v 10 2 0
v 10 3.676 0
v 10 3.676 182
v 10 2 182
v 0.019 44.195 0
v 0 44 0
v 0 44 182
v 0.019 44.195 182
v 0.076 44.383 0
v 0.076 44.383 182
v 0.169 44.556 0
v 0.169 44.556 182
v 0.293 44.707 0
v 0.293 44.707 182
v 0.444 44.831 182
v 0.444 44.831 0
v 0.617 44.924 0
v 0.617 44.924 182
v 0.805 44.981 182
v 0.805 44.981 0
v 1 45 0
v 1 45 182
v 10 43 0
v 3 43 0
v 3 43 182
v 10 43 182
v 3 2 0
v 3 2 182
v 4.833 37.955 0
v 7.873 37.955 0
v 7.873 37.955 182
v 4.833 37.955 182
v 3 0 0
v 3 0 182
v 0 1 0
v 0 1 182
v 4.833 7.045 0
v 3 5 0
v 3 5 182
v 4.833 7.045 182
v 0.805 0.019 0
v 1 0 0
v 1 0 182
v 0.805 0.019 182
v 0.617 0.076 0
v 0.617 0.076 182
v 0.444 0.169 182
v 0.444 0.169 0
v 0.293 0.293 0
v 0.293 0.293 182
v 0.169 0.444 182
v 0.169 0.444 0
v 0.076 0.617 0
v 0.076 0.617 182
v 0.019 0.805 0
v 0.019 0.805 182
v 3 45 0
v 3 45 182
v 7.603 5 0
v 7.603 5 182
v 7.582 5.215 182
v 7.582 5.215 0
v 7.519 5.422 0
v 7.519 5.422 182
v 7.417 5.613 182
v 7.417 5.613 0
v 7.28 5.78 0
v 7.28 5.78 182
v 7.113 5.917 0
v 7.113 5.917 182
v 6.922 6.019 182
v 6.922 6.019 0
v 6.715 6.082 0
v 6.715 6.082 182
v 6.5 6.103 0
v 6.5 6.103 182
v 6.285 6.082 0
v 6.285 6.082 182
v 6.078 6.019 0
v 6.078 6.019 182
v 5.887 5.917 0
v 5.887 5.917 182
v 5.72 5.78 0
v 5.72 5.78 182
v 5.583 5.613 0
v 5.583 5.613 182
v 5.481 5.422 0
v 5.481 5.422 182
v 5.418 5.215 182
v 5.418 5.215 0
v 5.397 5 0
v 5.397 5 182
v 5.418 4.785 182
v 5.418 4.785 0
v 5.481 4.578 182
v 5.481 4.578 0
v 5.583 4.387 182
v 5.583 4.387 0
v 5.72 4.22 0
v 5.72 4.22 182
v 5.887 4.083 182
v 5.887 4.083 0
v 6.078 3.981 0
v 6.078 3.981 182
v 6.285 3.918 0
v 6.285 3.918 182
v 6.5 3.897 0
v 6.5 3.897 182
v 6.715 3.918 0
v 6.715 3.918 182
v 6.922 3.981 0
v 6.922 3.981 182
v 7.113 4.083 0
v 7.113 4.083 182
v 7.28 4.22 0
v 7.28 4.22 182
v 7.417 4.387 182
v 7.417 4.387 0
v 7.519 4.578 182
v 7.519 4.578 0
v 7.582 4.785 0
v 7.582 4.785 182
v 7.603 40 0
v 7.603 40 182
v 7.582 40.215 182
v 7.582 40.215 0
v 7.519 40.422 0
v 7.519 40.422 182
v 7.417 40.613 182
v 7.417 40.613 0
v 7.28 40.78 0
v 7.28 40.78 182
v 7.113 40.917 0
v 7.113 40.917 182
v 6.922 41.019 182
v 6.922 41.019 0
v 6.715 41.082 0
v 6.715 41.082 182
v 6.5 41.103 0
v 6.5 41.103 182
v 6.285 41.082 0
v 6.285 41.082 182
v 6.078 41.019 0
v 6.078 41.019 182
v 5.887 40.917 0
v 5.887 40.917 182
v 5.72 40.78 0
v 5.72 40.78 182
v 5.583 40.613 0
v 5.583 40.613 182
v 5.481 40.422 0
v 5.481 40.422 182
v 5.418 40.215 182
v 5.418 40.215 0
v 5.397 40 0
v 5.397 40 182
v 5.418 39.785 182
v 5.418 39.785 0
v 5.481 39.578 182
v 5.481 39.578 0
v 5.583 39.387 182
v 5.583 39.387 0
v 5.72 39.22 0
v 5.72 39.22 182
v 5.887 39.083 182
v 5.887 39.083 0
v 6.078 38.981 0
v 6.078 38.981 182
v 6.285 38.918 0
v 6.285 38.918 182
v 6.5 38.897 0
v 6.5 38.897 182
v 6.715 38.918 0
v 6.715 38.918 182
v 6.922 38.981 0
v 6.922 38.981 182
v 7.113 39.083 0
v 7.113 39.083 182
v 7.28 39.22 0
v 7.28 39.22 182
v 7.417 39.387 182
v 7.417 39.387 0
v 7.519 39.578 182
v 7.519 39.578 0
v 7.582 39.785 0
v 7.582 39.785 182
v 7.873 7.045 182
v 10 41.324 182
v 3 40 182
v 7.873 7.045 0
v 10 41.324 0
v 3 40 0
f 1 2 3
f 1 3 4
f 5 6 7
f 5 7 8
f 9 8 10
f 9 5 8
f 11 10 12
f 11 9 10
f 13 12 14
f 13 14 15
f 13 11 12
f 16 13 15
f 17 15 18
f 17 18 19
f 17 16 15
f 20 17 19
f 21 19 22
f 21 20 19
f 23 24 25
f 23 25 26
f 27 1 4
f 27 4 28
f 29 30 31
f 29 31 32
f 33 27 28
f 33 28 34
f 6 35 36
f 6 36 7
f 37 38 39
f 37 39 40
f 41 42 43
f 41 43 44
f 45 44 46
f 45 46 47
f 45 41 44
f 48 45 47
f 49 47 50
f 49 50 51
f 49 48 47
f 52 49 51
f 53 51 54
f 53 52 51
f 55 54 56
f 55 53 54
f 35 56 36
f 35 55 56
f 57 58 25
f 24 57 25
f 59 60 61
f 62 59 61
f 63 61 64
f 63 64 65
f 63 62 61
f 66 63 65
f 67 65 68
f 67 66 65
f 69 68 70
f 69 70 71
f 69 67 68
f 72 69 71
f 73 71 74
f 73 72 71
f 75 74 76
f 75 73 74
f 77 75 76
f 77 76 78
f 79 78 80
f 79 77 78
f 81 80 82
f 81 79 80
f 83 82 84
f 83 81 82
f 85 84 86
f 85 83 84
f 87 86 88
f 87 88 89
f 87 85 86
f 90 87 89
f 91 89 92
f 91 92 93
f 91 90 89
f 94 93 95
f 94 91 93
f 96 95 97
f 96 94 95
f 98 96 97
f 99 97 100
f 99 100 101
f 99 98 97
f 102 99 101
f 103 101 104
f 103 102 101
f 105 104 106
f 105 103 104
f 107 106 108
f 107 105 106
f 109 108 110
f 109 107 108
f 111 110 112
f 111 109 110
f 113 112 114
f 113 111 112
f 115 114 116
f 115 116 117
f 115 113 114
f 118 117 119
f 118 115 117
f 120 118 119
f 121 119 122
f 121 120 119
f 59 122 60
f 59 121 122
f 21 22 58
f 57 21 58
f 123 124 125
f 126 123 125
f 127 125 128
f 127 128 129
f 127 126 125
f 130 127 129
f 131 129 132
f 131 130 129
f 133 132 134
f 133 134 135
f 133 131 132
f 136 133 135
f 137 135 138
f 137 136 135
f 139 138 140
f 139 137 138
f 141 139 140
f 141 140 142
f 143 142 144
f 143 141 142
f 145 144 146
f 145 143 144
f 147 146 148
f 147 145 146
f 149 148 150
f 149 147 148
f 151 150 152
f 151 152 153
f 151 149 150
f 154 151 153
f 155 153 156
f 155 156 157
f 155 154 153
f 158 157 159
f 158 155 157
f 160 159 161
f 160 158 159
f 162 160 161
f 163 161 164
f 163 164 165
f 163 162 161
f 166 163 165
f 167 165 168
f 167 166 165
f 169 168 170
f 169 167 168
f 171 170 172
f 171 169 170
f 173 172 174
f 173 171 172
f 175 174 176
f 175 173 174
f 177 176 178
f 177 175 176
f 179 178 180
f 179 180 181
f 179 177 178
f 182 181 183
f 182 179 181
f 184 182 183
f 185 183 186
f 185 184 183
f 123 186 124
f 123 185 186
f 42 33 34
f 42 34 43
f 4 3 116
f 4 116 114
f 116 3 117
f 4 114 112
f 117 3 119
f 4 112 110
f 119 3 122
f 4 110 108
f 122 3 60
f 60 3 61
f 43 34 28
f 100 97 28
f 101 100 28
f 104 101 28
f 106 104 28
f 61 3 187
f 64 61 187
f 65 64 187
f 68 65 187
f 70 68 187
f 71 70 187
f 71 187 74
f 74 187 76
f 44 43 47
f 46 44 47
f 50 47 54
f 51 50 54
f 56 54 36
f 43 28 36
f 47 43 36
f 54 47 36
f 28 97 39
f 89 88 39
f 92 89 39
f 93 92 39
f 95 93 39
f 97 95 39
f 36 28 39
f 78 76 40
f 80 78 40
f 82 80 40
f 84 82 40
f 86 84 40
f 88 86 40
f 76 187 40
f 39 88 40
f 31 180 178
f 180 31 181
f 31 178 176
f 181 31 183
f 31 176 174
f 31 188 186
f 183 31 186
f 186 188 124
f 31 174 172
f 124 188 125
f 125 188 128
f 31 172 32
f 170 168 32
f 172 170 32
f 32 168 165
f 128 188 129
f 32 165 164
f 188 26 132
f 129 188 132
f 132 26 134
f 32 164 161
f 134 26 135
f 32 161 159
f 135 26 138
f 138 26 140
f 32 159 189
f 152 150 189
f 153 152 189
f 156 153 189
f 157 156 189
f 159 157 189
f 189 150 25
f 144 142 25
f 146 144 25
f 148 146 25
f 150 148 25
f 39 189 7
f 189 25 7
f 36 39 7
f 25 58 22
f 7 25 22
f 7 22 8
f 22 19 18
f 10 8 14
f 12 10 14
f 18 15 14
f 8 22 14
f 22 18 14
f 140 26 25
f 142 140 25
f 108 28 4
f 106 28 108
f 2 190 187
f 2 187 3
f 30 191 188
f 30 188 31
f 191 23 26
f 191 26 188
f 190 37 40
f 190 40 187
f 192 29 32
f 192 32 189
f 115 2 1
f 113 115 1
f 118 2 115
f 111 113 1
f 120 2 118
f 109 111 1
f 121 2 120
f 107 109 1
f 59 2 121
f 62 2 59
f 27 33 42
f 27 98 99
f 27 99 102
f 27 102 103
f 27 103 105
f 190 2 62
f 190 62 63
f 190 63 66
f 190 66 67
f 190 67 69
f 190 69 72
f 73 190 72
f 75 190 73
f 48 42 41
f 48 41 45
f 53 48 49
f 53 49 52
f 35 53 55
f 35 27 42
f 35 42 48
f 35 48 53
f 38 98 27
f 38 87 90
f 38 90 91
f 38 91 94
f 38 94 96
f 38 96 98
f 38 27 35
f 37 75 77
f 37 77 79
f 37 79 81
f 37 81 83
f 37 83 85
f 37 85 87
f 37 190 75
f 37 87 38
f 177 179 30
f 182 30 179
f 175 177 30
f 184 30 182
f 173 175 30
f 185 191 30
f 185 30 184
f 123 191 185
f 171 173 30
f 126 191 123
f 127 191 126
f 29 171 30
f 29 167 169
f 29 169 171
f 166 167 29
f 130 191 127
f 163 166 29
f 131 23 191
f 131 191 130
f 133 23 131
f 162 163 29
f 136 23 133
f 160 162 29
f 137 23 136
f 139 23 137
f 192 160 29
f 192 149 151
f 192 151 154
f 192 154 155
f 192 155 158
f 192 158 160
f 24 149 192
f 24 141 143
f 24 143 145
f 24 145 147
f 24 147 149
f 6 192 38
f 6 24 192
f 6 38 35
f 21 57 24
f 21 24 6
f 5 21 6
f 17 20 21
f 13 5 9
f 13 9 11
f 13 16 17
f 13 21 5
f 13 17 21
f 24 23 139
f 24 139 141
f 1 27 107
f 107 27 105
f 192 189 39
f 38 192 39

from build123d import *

# Parameters (mm, degrees)
SKETCH_1_R      = 1.102856911
EXTRUDE_1_DEPTH = 182


with BuildPart() as part:
    # 草图1 → 凸台-拉伸1 (new body)
    with BuildSketch(Plane.XY):
        with BuildLine():
            Line((1, 45), (3, 45))
            Line((3, 45), (3, 43))
            Line((3, 43), (10, 43))
            Line((10, 43), (10, 41.324203171))
            Line((10, 41.324203171), (7.873486532, 37.954843198))
            Line((7.873486532, 37.954843198), (4.832988285, 37.954843198))
            Line((4.832988285, 37.954843198), (3, 40))
            Line((3, 40), (3, 5))
            Line((3, 5), (4.832988285, 7.045156802))
            Line((4.832988285, 7.045156802), (7.873486532, 7.045156802))
            Line((7.873486532, 7.045156802), (10, 3.675796829))
            Line((10, 3.675796829), (10, 2))
            Line((10, 2), (3, 2))
            Line((3, 2), (3, 0))
            Line((3, 0), (1, 0))
            ThreePointArc((1, 0), (0.292893219, 0.292893219), (0, 1))
            Line((0, 1), (0, 44))
            ThreePointArc((0, 44), (0.292893219, 44.707106781), (1, 45))
        make_face()
        with Locations((6.5, 5)):
            Circle(SKETCH_1_R, mode=Mode.SUBTRACT)
        with Locations((6.5, 40)):
            Circle(SKETCH_1_R, mode=Mode.SUBTRACT)
    extrude(amount=EXTRUDE_1_DEPTH)


solid = part.part
